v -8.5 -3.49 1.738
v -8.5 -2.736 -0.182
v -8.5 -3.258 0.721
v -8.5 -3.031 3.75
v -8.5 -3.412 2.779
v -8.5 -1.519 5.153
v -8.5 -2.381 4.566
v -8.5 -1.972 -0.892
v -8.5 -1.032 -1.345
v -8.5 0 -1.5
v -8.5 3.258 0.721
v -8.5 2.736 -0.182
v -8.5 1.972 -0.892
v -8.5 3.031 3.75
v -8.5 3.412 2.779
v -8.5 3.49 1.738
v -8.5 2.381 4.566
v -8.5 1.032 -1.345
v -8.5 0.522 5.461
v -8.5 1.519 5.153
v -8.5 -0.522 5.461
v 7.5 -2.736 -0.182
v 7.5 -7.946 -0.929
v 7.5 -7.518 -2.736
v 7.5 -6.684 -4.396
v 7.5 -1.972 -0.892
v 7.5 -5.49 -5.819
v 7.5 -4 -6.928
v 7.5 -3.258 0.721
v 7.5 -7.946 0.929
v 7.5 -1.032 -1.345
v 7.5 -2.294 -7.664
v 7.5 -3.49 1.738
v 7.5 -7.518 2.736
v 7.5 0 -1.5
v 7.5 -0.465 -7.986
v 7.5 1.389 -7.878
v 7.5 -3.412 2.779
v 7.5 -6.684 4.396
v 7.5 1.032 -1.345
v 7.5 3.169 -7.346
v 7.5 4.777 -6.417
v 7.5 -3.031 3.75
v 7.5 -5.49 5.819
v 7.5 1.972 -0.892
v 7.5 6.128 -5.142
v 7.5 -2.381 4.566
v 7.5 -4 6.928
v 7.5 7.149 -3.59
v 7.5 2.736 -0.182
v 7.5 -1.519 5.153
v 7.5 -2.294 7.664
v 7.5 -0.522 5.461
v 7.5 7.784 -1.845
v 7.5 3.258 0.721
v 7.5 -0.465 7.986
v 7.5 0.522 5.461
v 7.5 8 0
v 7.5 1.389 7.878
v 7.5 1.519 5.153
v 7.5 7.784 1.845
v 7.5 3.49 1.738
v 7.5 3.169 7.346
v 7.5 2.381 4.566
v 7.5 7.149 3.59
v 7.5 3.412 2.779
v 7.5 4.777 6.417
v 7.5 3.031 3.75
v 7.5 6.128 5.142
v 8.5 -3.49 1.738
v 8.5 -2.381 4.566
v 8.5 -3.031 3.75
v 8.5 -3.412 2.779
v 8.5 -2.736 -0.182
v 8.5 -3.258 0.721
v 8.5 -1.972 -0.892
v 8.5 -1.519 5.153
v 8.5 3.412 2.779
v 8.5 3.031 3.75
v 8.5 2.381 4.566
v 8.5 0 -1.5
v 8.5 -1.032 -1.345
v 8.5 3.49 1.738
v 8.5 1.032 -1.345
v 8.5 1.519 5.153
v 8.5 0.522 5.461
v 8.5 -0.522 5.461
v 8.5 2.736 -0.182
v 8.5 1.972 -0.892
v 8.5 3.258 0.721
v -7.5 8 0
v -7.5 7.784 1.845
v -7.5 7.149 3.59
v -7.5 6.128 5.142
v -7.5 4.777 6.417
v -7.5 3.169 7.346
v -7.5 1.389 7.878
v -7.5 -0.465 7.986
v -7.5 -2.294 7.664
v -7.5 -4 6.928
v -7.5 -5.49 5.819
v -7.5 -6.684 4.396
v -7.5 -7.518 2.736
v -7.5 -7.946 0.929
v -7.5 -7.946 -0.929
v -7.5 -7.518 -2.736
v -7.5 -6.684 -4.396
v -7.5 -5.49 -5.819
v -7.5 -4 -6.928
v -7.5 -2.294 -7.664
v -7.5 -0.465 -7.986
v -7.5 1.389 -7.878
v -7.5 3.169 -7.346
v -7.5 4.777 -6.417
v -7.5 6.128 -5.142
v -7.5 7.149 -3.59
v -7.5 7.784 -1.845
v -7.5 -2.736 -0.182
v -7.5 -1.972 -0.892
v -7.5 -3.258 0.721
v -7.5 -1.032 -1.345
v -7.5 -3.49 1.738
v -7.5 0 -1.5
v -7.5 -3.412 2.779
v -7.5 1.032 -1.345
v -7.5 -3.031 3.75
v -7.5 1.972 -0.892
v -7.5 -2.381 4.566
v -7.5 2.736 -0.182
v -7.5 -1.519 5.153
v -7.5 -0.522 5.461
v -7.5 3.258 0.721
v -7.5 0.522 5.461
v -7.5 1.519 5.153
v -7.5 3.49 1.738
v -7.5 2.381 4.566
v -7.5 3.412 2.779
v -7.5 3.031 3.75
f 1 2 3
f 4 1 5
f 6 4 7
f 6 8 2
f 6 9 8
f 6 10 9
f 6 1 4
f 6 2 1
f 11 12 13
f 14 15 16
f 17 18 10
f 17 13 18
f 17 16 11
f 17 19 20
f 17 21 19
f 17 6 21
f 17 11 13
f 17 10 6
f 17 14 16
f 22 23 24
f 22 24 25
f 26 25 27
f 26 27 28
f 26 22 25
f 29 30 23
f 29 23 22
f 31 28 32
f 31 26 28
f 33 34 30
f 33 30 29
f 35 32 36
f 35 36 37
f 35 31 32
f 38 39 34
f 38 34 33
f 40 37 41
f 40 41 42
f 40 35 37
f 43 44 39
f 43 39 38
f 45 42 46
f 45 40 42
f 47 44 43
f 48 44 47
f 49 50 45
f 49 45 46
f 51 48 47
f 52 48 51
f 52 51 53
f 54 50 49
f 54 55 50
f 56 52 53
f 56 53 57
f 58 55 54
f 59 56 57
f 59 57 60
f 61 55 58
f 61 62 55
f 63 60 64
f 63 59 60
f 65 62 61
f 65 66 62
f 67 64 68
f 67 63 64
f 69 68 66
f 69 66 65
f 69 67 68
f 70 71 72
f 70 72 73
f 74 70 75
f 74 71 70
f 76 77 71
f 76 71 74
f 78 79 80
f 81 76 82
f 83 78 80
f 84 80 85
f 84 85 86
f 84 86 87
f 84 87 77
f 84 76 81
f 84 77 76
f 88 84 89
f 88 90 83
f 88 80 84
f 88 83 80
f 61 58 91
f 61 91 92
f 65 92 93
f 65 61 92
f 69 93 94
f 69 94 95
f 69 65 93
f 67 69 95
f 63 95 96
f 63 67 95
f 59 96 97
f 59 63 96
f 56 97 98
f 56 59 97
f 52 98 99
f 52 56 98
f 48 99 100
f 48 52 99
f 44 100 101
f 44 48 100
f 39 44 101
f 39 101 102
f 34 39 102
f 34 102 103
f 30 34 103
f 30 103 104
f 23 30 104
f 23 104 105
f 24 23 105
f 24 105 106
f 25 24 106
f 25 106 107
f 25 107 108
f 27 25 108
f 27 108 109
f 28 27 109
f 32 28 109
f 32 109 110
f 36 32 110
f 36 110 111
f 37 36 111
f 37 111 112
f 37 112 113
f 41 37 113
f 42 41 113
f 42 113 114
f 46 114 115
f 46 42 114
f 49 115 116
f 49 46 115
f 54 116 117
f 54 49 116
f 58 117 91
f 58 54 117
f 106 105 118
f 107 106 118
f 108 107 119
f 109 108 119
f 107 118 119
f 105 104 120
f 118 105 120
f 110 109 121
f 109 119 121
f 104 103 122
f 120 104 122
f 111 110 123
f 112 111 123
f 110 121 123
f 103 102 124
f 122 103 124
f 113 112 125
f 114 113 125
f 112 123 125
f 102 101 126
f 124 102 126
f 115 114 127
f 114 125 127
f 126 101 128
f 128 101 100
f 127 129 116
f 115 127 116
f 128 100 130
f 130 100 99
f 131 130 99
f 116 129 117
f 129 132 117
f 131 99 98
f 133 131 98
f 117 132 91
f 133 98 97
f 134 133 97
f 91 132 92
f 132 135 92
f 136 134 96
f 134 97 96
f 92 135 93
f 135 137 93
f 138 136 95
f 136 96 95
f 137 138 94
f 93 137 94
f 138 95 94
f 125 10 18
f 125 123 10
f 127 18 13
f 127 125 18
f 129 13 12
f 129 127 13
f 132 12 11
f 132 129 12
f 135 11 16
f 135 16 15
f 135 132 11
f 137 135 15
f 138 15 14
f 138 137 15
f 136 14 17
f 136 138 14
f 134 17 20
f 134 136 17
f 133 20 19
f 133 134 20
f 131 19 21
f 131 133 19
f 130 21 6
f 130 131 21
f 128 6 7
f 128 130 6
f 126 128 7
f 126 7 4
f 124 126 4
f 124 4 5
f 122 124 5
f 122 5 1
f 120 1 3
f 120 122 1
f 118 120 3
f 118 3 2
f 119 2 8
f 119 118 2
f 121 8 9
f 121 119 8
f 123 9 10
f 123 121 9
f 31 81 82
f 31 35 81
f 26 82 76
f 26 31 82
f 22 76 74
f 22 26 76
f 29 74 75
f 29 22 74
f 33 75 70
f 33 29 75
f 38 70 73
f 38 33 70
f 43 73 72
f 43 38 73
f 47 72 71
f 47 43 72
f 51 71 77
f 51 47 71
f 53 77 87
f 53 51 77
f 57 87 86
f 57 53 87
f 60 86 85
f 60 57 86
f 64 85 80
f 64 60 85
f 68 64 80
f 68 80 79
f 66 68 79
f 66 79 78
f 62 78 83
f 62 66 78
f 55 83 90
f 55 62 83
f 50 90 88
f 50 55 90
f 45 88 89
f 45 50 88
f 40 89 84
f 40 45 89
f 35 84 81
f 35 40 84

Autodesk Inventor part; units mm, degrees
ref_plane "YZ Plane" through (0, 0, 0) normal (1, 0, 0) x (0, 1, 0)
ref_plane "XZ Plane" through (0, 0, 0) normal (0, 1, 0) x (-1, 0, 0)
ref_plane "XY Plane" through (0, 0, 0) normal (0, 0, 1) x (1, 0, 0)
sketch "Szkic1" plane through (0, 0, 0) normal (1, 0, 0) x (0, 1, 0)
  circle A0 centre (0, 0) radius 8
  dimension "d0" = 16
extrude "Wyciągnięcie proste1" add sketch "Szkic1" along normal mid plane 15
sketch "Szkic2" plane through (7.5, 0, 0) normal (1, 0, 0) x (0, 0, -1)
  circle A0 centre (-2, 0) radius 3.5
  point P0 (0, 0)
  dimension "d3" = 7
  dimension "d4" = 2
extrude "Wyciągnięcie proste2" add sketch "Szkic2" along normal blind 1
mirror "Odbij1" about plane through (0, 0, 0) normal (1, 0, 0) of "Wyciągnięcie proste2", "Wyciągnięcie proste1"
sketch "Szkic3" plane through (7.5, 0, 0) normal (1, 0, 0) x (0, 0, -1)
  point P0 (0, 0)
sketch "Szkic4" plane through (8.5, 0, 2) normal (1, 0, 0) x (0, 0, -1)
  circle A0 centre (2, 0) radius 8 projected
  circle A1 centre (0, 0) radius 3.5 projected
  point P0 (-6, 0)
  point P1 (-3.5, 0)
sketch "Szkic8" plane through (-7.5, 0, 0) normal (-1, 0, 0) x (0, 0, 1)
  circle A0 centre (0, 0) radius 8 projected
  line L0 (8, 0) -> (5.5, 0)
  circle A1 centre (2, 0) radius 3.5 projected
properties part number "Przekładnia rolka" material "Stal"
